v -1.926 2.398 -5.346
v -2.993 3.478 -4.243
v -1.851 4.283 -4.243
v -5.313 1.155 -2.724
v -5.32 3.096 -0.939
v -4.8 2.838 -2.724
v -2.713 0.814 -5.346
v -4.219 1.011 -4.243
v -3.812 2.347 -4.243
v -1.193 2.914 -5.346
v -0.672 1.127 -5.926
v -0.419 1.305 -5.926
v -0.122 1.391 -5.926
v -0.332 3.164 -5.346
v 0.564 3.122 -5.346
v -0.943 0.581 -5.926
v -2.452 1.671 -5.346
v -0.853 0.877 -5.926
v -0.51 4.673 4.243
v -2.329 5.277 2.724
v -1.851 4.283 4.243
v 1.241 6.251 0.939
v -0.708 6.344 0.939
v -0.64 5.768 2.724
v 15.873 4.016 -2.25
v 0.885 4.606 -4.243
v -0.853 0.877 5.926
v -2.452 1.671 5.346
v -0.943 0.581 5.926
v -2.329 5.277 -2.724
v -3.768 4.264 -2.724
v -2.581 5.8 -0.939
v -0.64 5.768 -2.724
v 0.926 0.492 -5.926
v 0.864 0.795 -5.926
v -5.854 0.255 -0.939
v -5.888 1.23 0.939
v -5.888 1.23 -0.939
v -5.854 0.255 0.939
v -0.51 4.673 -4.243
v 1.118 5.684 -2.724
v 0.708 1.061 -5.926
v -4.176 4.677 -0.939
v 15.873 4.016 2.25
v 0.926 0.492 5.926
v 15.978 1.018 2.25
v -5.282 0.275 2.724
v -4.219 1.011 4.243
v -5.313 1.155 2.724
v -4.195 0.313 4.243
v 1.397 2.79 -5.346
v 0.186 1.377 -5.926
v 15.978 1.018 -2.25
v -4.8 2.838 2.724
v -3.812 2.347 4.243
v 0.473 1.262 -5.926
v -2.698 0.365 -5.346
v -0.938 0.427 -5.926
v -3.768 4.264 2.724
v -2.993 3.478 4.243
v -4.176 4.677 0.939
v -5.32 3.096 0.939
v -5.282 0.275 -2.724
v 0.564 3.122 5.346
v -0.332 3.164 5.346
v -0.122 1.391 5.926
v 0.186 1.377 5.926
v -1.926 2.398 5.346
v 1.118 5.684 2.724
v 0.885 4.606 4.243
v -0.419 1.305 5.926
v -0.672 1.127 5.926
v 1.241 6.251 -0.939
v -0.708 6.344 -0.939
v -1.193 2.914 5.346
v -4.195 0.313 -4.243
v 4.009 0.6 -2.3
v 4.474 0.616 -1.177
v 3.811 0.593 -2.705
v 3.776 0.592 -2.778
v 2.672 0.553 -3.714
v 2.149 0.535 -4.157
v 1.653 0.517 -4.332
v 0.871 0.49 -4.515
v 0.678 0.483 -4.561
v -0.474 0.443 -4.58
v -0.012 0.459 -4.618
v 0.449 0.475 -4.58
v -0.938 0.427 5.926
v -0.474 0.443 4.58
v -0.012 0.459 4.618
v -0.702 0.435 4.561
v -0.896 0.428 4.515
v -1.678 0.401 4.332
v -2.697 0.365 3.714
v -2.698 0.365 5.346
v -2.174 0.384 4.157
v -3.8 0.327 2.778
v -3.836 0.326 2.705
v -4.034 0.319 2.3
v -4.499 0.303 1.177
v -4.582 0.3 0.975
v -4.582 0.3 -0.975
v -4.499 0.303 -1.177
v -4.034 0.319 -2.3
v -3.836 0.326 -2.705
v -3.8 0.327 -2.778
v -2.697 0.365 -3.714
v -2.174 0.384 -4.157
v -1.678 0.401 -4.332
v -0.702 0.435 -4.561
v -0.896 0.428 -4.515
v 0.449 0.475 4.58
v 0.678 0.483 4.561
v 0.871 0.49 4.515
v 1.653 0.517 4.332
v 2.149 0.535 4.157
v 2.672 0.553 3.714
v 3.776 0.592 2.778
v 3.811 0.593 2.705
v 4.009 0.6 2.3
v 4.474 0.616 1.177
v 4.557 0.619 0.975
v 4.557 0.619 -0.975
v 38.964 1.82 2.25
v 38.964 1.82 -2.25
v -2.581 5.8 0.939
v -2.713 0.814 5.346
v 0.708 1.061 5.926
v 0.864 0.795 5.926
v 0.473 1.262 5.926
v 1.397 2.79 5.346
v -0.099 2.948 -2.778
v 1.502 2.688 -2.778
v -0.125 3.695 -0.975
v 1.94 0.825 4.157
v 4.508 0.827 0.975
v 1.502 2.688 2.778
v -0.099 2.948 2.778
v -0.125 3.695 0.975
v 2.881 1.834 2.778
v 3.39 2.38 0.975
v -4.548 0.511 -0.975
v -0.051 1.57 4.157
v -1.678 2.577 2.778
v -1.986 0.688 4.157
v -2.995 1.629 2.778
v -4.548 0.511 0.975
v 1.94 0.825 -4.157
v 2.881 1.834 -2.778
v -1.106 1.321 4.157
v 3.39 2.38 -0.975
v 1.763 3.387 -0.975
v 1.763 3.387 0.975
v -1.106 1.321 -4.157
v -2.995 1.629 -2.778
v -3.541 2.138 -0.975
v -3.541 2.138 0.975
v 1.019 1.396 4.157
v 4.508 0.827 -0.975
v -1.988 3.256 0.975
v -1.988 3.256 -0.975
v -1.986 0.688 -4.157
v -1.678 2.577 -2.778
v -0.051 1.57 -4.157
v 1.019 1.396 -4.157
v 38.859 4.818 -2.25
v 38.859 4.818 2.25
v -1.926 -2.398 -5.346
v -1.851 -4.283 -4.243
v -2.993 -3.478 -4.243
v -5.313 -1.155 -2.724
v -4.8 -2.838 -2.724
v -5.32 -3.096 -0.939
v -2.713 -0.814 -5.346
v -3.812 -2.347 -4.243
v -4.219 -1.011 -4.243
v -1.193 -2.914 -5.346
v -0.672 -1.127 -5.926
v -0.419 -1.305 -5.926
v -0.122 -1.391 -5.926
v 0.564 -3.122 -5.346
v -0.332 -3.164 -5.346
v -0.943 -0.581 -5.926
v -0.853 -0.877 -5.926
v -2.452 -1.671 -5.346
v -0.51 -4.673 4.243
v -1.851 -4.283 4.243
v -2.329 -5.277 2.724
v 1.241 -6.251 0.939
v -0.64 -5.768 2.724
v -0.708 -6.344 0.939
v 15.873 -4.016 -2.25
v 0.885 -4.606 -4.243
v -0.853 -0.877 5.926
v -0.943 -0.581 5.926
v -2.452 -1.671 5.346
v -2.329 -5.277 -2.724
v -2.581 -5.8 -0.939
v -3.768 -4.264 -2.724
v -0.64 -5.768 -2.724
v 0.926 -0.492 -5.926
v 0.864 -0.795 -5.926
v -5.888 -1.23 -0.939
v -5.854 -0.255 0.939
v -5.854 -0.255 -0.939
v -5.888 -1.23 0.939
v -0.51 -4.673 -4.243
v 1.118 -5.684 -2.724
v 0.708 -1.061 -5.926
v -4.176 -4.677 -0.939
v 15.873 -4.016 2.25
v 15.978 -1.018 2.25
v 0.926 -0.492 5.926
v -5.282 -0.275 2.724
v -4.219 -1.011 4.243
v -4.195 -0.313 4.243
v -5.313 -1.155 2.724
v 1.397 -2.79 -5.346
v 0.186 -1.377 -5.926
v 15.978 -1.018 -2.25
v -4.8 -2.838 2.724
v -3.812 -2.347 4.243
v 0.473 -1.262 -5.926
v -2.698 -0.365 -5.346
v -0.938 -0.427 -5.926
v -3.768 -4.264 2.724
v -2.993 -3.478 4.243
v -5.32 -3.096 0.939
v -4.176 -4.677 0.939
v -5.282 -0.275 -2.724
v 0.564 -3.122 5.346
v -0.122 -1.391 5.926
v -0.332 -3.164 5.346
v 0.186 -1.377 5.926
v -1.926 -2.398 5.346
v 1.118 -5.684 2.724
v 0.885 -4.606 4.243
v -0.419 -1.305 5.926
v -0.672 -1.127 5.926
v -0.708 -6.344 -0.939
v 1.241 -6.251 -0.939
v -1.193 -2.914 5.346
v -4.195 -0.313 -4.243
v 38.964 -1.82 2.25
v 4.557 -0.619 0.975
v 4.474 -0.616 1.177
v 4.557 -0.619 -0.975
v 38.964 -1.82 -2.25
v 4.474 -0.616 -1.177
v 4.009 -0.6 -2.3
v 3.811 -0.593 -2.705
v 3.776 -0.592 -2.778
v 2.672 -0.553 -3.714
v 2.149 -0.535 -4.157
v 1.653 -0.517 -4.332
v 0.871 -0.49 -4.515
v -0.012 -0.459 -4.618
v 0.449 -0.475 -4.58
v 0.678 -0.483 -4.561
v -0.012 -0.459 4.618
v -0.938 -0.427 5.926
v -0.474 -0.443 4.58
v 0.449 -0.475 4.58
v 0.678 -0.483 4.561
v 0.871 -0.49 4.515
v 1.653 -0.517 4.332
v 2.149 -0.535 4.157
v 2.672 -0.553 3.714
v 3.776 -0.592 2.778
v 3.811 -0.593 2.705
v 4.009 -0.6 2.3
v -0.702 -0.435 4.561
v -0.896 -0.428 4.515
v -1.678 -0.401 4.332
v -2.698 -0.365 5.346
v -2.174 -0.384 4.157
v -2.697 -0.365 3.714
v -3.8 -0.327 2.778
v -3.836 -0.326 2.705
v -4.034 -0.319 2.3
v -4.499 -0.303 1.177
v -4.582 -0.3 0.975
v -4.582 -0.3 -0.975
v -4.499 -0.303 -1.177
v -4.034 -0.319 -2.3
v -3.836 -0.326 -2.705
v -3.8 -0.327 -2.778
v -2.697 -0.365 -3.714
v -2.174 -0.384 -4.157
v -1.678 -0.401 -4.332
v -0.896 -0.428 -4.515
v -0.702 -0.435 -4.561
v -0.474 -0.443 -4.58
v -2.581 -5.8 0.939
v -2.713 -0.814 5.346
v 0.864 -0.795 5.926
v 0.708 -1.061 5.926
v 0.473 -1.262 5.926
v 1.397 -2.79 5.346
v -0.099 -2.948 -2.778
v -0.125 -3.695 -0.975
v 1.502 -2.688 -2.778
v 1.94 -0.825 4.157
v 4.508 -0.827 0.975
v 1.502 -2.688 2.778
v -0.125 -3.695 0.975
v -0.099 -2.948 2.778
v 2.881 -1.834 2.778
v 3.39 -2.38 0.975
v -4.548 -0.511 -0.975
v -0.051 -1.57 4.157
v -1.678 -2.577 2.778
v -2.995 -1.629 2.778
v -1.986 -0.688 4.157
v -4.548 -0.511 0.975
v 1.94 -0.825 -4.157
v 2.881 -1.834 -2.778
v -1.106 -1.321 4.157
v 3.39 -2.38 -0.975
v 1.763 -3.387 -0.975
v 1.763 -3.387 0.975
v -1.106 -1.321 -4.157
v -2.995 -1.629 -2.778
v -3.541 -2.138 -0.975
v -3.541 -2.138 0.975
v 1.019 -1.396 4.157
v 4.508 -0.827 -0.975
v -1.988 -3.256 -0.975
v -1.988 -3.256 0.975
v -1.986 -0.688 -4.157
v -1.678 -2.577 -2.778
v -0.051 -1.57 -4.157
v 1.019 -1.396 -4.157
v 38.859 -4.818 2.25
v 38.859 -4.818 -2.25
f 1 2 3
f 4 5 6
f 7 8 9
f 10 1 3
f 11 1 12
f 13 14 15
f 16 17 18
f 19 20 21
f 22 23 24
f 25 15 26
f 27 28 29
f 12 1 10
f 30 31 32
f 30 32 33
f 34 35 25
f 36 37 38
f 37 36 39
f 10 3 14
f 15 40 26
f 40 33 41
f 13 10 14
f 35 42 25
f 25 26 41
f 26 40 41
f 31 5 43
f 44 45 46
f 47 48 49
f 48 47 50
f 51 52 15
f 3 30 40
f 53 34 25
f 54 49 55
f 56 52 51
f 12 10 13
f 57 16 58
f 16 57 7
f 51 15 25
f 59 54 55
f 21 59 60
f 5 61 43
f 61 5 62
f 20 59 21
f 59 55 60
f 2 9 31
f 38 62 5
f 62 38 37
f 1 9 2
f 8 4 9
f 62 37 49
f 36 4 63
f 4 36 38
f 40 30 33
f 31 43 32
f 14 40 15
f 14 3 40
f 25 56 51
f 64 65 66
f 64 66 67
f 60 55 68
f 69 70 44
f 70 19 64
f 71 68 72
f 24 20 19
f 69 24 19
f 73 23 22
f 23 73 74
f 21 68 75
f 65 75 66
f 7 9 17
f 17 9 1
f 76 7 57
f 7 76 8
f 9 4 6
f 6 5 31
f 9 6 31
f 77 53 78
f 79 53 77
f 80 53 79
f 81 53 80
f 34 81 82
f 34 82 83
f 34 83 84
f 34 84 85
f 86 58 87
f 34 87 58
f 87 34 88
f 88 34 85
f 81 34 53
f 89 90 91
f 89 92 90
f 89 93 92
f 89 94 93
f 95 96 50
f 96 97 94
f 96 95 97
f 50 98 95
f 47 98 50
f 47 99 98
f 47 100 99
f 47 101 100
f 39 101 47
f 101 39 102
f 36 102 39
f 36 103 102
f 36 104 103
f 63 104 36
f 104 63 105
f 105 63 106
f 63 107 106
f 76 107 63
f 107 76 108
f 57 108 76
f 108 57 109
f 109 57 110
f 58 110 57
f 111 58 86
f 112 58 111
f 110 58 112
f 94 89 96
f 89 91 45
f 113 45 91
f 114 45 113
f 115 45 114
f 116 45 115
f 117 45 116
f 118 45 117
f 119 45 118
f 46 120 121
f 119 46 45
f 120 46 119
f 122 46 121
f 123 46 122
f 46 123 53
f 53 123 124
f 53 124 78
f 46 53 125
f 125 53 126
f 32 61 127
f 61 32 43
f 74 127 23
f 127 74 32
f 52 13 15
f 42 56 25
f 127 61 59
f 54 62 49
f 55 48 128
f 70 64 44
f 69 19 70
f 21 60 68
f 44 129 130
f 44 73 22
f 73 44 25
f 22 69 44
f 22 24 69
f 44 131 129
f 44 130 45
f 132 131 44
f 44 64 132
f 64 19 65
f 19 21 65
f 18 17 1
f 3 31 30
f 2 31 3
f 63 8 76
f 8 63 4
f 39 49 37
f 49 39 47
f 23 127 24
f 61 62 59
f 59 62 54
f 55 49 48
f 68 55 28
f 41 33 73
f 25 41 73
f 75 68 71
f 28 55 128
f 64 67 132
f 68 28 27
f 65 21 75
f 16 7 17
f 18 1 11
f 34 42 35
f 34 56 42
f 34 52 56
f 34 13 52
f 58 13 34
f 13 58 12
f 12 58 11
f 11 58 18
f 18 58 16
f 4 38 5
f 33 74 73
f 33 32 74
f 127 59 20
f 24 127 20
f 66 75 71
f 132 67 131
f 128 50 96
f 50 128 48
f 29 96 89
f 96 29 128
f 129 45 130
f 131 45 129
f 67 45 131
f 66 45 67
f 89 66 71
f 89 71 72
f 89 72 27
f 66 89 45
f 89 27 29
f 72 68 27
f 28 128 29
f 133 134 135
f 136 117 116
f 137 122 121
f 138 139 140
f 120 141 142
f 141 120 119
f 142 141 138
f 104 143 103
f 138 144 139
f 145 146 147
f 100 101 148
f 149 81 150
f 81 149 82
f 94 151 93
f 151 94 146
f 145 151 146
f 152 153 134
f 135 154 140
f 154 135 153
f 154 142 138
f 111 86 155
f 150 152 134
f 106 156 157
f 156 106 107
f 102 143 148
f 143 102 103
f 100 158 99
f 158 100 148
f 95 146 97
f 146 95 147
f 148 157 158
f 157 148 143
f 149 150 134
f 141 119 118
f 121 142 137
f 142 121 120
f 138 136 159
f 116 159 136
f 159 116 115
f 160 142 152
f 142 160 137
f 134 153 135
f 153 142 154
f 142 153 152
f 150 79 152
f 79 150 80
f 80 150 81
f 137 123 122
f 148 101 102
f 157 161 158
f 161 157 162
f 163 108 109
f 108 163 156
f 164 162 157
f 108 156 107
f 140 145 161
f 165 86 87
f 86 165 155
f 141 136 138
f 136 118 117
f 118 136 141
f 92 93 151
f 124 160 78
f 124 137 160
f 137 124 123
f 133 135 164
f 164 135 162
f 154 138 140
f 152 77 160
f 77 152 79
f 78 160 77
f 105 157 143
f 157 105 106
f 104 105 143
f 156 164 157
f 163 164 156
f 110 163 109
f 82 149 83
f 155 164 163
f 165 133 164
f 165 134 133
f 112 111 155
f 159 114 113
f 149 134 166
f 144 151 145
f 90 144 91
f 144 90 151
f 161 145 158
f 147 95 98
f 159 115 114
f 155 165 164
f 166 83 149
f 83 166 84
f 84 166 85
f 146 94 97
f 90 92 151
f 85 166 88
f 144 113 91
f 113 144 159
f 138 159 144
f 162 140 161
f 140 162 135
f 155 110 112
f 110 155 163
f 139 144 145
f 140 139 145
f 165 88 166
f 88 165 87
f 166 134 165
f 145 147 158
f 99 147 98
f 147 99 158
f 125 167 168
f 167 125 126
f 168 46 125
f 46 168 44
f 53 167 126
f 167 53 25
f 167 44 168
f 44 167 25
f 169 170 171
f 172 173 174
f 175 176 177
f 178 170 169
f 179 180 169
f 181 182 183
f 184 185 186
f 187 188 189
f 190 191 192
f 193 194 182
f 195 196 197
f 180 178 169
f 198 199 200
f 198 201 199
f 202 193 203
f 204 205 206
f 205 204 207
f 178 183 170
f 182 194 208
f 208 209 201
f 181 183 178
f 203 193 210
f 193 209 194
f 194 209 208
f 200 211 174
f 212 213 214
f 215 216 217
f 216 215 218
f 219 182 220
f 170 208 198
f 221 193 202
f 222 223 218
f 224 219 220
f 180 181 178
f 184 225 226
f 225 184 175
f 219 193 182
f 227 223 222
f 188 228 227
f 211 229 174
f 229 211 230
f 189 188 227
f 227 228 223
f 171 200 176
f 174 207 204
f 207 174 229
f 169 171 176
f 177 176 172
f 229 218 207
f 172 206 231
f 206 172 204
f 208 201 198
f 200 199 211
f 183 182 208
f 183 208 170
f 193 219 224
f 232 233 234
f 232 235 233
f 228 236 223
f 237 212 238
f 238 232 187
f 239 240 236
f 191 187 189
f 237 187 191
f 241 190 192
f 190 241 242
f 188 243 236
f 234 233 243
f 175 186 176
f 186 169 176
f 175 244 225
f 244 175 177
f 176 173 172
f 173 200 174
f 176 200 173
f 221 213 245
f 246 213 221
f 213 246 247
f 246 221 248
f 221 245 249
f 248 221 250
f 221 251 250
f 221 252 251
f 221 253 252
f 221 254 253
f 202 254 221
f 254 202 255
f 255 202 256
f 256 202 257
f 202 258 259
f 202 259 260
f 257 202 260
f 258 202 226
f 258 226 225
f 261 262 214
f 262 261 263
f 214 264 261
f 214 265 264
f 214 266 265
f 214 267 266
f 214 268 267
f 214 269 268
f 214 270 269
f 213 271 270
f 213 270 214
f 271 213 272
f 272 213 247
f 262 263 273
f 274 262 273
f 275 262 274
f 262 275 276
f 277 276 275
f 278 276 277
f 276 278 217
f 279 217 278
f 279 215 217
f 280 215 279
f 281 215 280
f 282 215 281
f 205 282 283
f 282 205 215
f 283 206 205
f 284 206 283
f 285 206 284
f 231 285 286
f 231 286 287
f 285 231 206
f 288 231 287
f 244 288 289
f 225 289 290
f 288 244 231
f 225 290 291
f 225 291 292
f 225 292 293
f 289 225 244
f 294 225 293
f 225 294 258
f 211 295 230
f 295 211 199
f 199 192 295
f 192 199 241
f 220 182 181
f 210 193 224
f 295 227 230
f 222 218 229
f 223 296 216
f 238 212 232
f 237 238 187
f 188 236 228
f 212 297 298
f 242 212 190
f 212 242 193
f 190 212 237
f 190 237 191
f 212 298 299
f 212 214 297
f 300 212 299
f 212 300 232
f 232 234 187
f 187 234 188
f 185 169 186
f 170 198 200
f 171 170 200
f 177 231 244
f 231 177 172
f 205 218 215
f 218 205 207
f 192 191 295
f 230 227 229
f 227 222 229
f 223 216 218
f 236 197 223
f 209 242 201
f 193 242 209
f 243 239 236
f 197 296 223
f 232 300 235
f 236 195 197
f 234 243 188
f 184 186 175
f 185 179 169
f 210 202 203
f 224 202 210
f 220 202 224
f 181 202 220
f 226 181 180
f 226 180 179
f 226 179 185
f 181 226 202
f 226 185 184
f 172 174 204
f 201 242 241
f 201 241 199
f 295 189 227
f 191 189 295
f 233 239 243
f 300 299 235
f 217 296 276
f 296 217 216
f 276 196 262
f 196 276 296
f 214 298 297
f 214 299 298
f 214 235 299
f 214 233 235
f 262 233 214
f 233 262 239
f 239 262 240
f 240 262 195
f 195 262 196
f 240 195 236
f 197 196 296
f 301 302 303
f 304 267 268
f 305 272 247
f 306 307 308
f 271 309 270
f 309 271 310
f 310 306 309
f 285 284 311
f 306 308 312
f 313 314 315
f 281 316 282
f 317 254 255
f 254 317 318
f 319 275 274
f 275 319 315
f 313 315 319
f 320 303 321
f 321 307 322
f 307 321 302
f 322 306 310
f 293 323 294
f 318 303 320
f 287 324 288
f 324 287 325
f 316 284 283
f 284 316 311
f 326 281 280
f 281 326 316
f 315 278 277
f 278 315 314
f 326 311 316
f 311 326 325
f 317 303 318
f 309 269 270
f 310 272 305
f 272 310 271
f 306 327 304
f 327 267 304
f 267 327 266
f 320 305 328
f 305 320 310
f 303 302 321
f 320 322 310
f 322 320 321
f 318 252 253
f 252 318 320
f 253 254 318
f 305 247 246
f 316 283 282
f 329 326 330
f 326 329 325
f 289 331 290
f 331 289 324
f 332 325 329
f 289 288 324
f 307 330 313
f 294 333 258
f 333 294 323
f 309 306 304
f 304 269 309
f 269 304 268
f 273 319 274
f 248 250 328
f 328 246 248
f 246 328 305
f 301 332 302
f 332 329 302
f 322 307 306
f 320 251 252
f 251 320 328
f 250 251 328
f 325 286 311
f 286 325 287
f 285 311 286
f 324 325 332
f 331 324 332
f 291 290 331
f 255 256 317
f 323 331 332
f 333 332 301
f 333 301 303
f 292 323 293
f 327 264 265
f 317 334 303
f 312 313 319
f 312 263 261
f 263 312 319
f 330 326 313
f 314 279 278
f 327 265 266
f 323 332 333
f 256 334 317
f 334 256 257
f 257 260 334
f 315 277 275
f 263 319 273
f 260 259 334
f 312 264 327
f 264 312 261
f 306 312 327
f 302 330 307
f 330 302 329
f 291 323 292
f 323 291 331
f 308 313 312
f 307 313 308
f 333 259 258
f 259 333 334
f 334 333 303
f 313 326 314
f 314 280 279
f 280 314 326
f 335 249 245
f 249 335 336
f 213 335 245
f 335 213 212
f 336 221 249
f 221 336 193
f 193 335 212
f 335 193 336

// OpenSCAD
// Measurements
MirrorRadius = 18.96;
MirrorHeight = 3.3;
MirrorCircleWallThickness = 2.016;
MirrorCircleWallBufferSpace = .2;
MirrorCircleWallHeight = 4.95;

// Mirror Ball
MirrorBallOffset = 8;
MirrorBallRadius = 5;

// Derived measurements
mirrorCircleRadius = MirrorRadius+MirrorCircleWallBufferSpace+MirrorCircleWallThickness;
mirrorCircleZeroZ = MirrorCircleWallHeight/2;

// Derived Objects
connectorCube = [MirrorBallOffset-MirrorBallRadius+MirrorCircleWallThickness*2,MirrorBallRadius,MirrorCircleWallHeight-1];
connectorStartPoint = [mirrorCircleRadius-MirrorCircleWallThickness,0,mirrorCircleZeroZ];

// Build Object
// bikeMirrorAndBall();

module bikeMirror() {
	translate([0,0,1.15]) color("Gainsboro") cylinder(3.3,MirrorRadius,MirrorRadius);
}

module mirrorCircleHolder() {
	difference() {
		color(0.9,0.6,1,0.1)
		cylinder(MirrorCircleWallHeight,mirrorCircleRadius,mirrorCircleRadius); // Circle
		translate([0,0,1.15]) cylinder(MirrorCircleWallHeight,MirrorRadius+MirrorCircleWallBufferSpace,MirrorRadius+MirrorCircleWallBufferSpace); // Hole
	} 
}

module mirrorBall() {
	translate([mirrorCircleRadius+MirrorBallOffset,0,mirrorCircleZeroZ]) sphere(MirrorBallRadius);
}

connectorCenter = forVectorAtIndexAddNum(connectorStartPoint,0,connectorCube[0]/2);
cutCylinderRadius = 4.5;
cutCylinderCenter = forVectorAtIndexAddNum(connectorCenter,1,cutCylinderRadius+1.5);
module mirrorCircleBallConnector() {
	difference() {
		cubeStartCenteredOnPoint(connectorCube, connectorStartPoint);
		//cylinder side cut
		translate(cutCylinderCenter) 
		cylinder(h=10,r=cutCylinderRadius,center=true, $fn=50);
		mirror([0,-1,0])
		translate(cutCylinderCenter) 
		cylinder(h=10,r=cutCylinderRadius,center=true, $fn=50);
		
	}
}

module bikeMirrorAndBall() {
	// bikeMirror();
	mirrorCircleHolder();
	mirrorBall();
	mirrorCircleBallConnector();
}

///////////////////
///// UTILITIES
///////////////////
function forVectorAtIndexAddNum(vector,index,num) = [index==0?vector[0]+num:vector[0],
													index==1?vector[1]+num:vector[1],
													index==2?vector[2]+num:vector[2]];


module cubeStartCenteredOnPoint(c,p) {
	yOffset = c[1]/2;
	zOffset = c[2]/2;
	echo("p:", p);
	translate([p[0],p[1]-yOffset,p[2]-zOffset]) {
		cube(c);
	}
}

/////////////////
// Main beam
/////////////////
// Constants
SpoonHoleLessPercentage = 1/3;

// Derived Vars
spoonRadius = MirrorBallRadius*1.2;
spoonCutterCube = [(spoonRadius+1)*2,spoonRadius+1,(spoonRadius+1)*2];
barCube = [10, spoonRadius/2,spoonRadius*.75];

// Build Object
color(0.9,0.6,1,0.1)
spoonArmWithOffset();
mirror([0,1,0]) spoonArmWithOffset();
// color(0.0,0.6,0,0.1)
// sphere(MirrorBallRadius);

module spoonHalf() {
	difference() {
		sphere(spoonRadius);
		translate([-spoonCutterCube[0]/2,-spoonCutterCube[1],-spoonCutterCube[2]/2]) cube(spoonCutterCube);
	}
}

module spoonBlankWithHead() {
	hull() {
		spoonHalf();
		translate([spoonRadius, 0, -barCube[2]/2]) cube(barCube);
	}
}

module spoonWithHead() {
	difference() {
		spoonBlankWithHead();
		translate([0,-MirrorBallRadius*SpoonHoleLessPercentage,0]) sphere(MirrorBallRadius);
	}
		// translate([0,-MirrorBallRadius*SpoonHoleLessPercentage,0]) sphere(MirrorBallRadius);
}

module spoonArmWithOffset() {
	translate([-spoonRadius,0,0]) {
		rotate([0,0,2],[-10,0,1]) {
			translate([spoonRadius,MirrorBallRadius*1/20]) {
				spoonWithHead();
				translate([spoonRadius+barCube[0],0,-barCube[2]/2]) cube([23,barCube[1],barCube[2]]);
			}
		}
	}
}
